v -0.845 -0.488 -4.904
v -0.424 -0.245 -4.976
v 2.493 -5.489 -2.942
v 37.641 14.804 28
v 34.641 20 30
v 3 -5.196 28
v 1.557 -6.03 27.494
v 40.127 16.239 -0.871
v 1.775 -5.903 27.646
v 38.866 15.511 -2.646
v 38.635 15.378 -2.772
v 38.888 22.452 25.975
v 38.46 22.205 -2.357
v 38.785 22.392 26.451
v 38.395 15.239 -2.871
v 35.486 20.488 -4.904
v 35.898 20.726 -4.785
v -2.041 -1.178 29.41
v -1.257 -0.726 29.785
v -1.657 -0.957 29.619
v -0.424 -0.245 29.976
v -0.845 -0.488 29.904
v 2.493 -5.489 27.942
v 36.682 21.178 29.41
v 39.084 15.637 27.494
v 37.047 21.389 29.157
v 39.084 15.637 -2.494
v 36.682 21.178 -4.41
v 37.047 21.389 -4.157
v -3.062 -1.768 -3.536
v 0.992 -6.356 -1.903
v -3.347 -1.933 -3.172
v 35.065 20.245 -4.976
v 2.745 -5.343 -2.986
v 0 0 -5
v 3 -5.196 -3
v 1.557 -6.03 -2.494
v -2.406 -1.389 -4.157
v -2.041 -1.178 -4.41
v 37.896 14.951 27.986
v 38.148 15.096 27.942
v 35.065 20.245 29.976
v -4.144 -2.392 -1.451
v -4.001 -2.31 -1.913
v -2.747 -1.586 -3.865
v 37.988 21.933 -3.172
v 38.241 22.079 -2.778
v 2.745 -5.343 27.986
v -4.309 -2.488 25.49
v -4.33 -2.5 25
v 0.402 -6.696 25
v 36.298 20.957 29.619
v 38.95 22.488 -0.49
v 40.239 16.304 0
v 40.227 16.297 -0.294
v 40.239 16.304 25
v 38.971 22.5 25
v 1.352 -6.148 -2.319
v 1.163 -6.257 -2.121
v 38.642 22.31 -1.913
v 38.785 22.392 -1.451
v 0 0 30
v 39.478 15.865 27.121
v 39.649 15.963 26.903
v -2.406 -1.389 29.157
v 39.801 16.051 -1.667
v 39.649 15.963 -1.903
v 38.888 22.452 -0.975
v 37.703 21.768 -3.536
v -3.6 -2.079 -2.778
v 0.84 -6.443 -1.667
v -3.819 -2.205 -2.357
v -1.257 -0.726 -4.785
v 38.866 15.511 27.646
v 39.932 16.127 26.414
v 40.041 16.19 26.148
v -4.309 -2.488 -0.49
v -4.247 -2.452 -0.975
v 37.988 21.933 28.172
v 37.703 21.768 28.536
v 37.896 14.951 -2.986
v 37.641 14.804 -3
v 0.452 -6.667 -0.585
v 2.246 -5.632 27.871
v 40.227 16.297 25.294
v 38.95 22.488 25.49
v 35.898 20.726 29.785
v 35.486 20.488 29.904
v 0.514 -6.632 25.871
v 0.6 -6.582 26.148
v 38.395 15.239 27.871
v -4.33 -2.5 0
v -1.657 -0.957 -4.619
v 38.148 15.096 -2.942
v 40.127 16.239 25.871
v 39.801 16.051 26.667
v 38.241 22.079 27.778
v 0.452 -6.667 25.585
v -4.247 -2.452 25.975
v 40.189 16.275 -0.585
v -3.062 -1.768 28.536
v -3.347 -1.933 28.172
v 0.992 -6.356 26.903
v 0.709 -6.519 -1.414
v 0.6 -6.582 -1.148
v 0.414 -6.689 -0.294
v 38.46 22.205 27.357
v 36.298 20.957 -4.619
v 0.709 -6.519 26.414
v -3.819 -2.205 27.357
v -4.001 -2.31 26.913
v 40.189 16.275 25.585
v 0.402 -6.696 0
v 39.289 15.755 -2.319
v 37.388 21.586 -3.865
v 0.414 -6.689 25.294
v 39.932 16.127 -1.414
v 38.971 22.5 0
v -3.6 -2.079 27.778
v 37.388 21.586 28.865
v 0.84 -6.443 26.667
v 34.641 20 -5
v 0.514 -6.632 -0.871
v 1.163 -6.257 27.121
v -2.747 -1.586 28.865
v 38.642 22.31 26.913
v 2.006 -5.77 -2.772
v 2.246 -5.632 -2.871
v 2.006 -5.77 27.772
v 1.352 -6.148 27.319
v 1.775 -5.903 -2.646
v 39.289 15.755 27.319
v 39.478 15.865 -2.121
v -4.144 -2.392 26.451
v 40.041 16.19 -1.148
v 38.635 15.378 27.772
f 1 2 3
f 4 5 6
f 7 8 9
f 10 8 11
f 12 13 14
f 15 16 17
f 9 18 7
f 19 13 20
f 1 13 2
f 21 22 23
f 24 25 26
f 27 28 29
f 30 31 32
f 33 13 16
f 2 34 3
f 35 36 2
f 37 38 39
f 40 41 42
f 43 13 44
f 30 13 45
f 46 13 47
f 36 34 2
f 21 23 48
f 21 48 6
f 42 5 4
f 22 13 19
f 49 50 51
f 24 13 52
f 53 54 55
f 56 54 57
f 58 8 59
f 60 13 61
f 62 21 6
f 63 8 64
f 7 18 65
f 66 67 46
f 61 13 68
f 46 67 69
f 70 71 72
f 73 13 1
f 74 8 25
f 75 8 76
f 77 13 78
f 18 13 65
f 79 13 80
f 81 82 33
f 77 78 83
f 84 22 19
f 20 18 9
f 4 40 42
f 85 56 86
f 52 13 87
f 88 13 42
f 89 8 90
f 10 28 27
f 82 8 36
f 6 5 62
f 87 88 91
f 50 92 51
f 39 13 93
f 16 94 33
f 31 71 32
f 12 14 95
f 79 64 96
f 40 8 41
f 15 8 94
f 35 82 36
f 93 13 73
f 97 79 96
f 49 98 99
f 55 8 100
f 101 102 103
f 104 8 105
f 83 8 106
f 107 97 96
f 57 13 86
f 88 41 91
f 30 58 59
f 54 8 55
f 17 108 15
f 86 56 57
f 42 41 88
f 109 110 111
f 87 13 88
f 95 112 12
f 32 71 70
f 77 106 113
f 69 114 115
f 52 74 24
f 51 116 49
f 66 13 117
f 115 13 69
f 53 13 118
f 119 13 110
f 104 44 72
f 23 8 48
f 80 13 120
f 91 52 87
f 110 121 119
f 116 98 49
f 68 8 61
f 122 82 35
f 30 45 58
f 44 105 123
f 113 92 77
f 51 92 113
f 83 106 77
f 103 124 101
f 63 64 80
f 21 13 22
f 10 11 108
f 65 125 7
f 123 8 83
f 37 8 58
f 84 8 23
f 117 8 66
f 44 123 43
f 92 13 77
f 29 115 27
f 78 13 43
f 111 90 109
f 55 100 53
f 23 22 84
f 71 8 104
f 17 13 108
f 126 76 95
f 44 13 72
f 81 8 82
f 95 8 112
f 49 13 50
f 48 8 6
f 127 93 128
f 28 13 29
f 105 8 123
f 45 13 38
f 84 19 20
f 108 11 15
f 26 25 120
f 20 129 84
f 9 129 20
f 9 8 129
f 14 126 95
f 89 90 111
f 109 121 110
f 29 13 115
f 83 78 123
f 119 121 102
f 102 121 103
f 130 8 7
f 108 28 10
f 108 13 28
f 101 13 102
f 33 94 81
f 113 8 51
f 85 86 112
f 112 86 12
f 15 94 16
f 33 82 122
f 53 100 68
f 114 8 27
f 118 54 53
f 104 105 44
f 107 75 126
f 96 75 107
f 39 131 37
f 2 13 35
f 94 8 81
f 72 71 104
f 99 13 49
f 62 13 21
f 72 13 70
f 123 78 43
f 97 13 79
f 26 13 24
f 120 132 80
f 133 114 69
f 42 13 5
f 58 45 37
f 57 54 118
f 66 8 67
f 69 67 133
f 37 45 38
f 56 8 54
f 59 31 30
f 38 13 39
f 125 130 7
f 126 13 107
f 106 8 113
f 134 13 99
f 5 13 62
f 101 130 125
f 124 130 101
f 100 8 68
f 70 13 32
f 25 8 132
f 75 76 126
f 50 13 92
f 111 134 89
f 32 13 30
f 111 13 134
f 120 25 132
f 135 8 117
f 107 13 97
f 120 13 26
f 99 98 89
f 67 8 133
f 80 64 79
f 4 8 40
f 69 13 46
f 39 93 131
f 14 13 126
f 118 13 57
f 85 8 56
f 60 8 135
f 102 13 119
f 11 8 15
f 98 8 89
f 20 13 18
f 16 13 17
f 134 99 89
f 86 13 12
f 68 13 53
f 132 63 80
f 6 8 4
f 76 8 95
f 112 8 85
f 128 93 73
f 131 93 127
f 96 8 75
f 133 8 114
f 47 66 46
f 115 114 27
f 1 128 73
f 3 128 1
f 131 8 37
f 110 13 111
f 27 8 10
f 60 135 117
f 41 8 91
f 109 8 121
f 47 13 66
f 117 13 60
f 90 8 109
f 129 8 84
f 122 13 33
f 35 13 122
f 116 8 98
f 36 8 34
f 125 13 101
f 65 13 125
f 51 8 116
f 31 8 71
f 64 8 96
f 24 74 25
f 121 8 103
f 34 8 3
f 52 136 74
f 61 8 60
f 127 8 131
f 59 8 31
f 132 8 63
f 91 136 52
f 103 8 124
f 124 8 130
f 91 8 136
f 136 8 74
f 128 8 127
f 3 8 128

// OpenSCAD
rotate([90, 0, 30]) hull() for (x = [0, 40], y = [0, 25]) translate([x, y, 0]) cylinder(h = 6, r1 = 5, r2 = 3, $fn = 64);
